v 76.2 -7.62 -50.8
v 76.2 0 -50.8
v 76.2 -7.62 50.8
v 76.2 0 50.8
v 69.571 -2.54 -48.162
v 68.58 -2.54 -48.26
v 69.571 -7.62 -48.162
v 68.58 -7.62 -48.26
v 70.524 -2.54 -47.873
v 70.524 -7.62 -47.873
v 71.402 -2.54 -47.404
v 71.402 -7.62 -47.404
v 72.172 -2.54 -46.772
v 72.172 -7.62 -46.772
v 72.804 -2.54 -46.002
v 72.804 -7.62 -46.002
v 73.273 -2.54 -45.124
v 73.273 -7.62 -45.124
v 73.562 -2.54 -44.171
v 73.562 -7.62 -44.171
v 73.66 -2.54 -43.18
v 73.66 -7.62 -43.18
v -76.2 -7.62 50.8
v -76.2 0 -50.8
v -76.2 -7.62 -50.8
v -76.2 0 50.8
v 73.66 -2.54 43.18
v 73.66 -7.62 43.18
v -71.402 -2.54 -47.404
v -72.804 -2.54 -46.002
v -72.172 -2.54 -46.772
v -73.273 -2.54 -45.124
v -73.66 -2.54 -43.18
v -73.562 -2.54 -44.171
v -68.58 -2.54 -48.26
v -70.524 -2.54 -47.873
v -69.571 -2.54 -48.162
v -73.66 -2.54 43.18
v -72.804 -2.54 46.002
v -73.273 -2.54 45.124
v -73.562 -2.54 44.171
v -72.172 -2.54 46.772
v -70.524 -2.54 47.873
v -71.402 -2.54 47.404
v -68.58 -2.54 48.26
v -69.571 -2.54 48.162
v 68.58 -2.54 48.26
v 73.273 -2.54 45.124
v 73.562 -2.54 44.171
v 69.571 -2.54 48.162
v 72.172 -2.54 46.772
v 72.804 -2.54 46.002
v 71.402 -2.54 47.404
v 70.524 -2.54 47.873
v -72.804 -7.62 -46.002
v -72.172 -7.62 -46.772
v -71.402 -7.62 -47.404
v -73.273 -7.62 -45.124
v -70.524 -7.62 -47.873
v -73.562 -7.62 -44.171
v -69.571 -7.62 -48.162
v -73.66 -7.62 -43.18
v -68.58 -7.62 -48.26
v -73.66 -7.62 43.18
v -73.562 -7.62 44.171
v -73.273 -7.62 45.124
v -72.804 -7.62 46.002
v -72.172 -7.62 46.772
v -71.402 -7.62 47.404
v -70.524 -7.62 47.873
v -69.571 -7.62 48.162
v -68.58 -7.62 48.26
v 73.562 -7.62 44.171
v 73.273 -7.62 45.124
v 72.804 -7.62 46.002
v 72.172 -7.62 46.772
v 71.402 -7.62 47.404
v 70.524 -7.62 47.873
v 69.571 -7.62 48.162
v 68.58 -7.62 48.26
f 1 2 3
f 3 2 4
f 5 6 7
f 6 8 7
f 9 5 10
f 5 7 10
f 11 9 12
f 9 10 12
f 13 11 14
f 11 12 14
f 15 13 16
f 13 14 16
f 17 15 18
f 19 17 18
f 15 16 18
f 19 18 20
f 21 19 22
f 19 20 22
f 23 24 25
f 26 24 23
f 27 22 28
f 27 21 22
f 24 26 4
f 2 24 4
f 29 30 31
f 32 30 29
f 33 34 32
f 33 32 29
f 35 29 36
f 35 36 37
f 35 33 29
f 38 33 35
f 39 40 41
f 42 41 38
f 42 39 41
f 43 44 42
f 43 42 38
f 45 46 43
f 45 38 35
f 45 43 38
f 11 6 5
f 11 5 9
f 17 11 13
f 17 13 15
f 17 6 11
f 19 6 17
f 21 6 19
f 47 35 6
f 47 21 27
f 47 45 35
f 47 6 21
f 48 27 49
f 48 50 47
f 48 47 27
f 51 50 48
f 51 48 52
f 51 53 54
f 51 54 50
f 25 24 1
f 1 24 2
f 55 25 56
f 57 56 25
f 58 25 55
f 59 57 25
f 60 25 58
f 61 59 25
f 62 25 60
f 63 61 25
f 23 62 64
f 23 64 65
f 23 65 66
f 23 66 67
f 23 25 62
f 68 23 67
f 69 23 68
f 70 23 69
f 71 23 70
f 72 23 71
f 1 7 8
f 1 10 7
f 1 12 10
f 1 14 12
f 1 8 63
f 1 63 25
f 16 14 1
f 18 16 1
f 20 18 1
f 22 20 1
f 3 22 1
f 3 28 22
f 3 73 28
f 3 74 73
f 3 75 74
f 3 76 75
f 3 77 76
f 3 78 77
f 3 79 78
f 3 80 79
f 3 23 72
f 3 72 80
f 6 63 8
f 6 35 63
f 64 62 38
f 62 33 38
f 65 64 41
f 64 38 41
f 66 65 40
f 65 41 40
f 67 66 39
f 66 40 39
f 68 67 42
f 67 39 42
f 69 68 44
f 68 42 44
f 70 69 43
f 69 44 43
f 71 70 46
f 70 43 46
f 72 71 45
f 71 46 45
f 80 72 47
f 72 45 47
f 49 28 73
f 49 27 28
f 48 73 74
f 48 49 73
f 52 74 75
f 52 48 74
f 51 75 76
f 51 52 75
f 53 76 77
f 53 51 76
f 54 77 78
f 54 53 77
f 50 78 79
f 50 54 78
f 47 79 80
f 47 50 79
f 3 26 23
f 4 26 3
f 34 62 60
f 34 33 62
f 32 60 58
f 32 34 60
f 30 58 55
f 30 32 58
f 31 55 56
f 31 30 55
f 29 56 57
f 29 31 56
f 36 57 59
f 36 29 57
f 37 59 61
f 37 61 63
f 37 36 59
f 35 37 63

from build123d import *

# Parameters (mm, degrees)
F0_W     = 152.4
F0_H     = 101.6
F1_DEPTH = 7.62
F2_T     = -2.54
F3_R     = 5.08


with BuildPart() as f1:
    # F0 (on Front) → F1 (new body)
    with BuildSketch(Plane.XZ):
        Rectangle(F0_W, F0_H)
    extrude(amount=F1_DEPTH)

    # F2
    f2_openings = [f1.faces().sort_by_distance(p)[0] for p in [
        (0, -7.62, 0),
    ]]
    offset(amount=F2_T, openings=f2_openings)

    # F3
    f3_edges = [f1.edges().sort_by_distance(p)[0] for p in [
        (-73.66, -5.08, 48.26),
        (-73.66, -5.08, -48.26),
        (73.66, -5.08, 48.26),
        (73.66, -5.08, -48.26),
    ]]
    fillet(f3_edges, radius=F3_R)


solid = f1.part
